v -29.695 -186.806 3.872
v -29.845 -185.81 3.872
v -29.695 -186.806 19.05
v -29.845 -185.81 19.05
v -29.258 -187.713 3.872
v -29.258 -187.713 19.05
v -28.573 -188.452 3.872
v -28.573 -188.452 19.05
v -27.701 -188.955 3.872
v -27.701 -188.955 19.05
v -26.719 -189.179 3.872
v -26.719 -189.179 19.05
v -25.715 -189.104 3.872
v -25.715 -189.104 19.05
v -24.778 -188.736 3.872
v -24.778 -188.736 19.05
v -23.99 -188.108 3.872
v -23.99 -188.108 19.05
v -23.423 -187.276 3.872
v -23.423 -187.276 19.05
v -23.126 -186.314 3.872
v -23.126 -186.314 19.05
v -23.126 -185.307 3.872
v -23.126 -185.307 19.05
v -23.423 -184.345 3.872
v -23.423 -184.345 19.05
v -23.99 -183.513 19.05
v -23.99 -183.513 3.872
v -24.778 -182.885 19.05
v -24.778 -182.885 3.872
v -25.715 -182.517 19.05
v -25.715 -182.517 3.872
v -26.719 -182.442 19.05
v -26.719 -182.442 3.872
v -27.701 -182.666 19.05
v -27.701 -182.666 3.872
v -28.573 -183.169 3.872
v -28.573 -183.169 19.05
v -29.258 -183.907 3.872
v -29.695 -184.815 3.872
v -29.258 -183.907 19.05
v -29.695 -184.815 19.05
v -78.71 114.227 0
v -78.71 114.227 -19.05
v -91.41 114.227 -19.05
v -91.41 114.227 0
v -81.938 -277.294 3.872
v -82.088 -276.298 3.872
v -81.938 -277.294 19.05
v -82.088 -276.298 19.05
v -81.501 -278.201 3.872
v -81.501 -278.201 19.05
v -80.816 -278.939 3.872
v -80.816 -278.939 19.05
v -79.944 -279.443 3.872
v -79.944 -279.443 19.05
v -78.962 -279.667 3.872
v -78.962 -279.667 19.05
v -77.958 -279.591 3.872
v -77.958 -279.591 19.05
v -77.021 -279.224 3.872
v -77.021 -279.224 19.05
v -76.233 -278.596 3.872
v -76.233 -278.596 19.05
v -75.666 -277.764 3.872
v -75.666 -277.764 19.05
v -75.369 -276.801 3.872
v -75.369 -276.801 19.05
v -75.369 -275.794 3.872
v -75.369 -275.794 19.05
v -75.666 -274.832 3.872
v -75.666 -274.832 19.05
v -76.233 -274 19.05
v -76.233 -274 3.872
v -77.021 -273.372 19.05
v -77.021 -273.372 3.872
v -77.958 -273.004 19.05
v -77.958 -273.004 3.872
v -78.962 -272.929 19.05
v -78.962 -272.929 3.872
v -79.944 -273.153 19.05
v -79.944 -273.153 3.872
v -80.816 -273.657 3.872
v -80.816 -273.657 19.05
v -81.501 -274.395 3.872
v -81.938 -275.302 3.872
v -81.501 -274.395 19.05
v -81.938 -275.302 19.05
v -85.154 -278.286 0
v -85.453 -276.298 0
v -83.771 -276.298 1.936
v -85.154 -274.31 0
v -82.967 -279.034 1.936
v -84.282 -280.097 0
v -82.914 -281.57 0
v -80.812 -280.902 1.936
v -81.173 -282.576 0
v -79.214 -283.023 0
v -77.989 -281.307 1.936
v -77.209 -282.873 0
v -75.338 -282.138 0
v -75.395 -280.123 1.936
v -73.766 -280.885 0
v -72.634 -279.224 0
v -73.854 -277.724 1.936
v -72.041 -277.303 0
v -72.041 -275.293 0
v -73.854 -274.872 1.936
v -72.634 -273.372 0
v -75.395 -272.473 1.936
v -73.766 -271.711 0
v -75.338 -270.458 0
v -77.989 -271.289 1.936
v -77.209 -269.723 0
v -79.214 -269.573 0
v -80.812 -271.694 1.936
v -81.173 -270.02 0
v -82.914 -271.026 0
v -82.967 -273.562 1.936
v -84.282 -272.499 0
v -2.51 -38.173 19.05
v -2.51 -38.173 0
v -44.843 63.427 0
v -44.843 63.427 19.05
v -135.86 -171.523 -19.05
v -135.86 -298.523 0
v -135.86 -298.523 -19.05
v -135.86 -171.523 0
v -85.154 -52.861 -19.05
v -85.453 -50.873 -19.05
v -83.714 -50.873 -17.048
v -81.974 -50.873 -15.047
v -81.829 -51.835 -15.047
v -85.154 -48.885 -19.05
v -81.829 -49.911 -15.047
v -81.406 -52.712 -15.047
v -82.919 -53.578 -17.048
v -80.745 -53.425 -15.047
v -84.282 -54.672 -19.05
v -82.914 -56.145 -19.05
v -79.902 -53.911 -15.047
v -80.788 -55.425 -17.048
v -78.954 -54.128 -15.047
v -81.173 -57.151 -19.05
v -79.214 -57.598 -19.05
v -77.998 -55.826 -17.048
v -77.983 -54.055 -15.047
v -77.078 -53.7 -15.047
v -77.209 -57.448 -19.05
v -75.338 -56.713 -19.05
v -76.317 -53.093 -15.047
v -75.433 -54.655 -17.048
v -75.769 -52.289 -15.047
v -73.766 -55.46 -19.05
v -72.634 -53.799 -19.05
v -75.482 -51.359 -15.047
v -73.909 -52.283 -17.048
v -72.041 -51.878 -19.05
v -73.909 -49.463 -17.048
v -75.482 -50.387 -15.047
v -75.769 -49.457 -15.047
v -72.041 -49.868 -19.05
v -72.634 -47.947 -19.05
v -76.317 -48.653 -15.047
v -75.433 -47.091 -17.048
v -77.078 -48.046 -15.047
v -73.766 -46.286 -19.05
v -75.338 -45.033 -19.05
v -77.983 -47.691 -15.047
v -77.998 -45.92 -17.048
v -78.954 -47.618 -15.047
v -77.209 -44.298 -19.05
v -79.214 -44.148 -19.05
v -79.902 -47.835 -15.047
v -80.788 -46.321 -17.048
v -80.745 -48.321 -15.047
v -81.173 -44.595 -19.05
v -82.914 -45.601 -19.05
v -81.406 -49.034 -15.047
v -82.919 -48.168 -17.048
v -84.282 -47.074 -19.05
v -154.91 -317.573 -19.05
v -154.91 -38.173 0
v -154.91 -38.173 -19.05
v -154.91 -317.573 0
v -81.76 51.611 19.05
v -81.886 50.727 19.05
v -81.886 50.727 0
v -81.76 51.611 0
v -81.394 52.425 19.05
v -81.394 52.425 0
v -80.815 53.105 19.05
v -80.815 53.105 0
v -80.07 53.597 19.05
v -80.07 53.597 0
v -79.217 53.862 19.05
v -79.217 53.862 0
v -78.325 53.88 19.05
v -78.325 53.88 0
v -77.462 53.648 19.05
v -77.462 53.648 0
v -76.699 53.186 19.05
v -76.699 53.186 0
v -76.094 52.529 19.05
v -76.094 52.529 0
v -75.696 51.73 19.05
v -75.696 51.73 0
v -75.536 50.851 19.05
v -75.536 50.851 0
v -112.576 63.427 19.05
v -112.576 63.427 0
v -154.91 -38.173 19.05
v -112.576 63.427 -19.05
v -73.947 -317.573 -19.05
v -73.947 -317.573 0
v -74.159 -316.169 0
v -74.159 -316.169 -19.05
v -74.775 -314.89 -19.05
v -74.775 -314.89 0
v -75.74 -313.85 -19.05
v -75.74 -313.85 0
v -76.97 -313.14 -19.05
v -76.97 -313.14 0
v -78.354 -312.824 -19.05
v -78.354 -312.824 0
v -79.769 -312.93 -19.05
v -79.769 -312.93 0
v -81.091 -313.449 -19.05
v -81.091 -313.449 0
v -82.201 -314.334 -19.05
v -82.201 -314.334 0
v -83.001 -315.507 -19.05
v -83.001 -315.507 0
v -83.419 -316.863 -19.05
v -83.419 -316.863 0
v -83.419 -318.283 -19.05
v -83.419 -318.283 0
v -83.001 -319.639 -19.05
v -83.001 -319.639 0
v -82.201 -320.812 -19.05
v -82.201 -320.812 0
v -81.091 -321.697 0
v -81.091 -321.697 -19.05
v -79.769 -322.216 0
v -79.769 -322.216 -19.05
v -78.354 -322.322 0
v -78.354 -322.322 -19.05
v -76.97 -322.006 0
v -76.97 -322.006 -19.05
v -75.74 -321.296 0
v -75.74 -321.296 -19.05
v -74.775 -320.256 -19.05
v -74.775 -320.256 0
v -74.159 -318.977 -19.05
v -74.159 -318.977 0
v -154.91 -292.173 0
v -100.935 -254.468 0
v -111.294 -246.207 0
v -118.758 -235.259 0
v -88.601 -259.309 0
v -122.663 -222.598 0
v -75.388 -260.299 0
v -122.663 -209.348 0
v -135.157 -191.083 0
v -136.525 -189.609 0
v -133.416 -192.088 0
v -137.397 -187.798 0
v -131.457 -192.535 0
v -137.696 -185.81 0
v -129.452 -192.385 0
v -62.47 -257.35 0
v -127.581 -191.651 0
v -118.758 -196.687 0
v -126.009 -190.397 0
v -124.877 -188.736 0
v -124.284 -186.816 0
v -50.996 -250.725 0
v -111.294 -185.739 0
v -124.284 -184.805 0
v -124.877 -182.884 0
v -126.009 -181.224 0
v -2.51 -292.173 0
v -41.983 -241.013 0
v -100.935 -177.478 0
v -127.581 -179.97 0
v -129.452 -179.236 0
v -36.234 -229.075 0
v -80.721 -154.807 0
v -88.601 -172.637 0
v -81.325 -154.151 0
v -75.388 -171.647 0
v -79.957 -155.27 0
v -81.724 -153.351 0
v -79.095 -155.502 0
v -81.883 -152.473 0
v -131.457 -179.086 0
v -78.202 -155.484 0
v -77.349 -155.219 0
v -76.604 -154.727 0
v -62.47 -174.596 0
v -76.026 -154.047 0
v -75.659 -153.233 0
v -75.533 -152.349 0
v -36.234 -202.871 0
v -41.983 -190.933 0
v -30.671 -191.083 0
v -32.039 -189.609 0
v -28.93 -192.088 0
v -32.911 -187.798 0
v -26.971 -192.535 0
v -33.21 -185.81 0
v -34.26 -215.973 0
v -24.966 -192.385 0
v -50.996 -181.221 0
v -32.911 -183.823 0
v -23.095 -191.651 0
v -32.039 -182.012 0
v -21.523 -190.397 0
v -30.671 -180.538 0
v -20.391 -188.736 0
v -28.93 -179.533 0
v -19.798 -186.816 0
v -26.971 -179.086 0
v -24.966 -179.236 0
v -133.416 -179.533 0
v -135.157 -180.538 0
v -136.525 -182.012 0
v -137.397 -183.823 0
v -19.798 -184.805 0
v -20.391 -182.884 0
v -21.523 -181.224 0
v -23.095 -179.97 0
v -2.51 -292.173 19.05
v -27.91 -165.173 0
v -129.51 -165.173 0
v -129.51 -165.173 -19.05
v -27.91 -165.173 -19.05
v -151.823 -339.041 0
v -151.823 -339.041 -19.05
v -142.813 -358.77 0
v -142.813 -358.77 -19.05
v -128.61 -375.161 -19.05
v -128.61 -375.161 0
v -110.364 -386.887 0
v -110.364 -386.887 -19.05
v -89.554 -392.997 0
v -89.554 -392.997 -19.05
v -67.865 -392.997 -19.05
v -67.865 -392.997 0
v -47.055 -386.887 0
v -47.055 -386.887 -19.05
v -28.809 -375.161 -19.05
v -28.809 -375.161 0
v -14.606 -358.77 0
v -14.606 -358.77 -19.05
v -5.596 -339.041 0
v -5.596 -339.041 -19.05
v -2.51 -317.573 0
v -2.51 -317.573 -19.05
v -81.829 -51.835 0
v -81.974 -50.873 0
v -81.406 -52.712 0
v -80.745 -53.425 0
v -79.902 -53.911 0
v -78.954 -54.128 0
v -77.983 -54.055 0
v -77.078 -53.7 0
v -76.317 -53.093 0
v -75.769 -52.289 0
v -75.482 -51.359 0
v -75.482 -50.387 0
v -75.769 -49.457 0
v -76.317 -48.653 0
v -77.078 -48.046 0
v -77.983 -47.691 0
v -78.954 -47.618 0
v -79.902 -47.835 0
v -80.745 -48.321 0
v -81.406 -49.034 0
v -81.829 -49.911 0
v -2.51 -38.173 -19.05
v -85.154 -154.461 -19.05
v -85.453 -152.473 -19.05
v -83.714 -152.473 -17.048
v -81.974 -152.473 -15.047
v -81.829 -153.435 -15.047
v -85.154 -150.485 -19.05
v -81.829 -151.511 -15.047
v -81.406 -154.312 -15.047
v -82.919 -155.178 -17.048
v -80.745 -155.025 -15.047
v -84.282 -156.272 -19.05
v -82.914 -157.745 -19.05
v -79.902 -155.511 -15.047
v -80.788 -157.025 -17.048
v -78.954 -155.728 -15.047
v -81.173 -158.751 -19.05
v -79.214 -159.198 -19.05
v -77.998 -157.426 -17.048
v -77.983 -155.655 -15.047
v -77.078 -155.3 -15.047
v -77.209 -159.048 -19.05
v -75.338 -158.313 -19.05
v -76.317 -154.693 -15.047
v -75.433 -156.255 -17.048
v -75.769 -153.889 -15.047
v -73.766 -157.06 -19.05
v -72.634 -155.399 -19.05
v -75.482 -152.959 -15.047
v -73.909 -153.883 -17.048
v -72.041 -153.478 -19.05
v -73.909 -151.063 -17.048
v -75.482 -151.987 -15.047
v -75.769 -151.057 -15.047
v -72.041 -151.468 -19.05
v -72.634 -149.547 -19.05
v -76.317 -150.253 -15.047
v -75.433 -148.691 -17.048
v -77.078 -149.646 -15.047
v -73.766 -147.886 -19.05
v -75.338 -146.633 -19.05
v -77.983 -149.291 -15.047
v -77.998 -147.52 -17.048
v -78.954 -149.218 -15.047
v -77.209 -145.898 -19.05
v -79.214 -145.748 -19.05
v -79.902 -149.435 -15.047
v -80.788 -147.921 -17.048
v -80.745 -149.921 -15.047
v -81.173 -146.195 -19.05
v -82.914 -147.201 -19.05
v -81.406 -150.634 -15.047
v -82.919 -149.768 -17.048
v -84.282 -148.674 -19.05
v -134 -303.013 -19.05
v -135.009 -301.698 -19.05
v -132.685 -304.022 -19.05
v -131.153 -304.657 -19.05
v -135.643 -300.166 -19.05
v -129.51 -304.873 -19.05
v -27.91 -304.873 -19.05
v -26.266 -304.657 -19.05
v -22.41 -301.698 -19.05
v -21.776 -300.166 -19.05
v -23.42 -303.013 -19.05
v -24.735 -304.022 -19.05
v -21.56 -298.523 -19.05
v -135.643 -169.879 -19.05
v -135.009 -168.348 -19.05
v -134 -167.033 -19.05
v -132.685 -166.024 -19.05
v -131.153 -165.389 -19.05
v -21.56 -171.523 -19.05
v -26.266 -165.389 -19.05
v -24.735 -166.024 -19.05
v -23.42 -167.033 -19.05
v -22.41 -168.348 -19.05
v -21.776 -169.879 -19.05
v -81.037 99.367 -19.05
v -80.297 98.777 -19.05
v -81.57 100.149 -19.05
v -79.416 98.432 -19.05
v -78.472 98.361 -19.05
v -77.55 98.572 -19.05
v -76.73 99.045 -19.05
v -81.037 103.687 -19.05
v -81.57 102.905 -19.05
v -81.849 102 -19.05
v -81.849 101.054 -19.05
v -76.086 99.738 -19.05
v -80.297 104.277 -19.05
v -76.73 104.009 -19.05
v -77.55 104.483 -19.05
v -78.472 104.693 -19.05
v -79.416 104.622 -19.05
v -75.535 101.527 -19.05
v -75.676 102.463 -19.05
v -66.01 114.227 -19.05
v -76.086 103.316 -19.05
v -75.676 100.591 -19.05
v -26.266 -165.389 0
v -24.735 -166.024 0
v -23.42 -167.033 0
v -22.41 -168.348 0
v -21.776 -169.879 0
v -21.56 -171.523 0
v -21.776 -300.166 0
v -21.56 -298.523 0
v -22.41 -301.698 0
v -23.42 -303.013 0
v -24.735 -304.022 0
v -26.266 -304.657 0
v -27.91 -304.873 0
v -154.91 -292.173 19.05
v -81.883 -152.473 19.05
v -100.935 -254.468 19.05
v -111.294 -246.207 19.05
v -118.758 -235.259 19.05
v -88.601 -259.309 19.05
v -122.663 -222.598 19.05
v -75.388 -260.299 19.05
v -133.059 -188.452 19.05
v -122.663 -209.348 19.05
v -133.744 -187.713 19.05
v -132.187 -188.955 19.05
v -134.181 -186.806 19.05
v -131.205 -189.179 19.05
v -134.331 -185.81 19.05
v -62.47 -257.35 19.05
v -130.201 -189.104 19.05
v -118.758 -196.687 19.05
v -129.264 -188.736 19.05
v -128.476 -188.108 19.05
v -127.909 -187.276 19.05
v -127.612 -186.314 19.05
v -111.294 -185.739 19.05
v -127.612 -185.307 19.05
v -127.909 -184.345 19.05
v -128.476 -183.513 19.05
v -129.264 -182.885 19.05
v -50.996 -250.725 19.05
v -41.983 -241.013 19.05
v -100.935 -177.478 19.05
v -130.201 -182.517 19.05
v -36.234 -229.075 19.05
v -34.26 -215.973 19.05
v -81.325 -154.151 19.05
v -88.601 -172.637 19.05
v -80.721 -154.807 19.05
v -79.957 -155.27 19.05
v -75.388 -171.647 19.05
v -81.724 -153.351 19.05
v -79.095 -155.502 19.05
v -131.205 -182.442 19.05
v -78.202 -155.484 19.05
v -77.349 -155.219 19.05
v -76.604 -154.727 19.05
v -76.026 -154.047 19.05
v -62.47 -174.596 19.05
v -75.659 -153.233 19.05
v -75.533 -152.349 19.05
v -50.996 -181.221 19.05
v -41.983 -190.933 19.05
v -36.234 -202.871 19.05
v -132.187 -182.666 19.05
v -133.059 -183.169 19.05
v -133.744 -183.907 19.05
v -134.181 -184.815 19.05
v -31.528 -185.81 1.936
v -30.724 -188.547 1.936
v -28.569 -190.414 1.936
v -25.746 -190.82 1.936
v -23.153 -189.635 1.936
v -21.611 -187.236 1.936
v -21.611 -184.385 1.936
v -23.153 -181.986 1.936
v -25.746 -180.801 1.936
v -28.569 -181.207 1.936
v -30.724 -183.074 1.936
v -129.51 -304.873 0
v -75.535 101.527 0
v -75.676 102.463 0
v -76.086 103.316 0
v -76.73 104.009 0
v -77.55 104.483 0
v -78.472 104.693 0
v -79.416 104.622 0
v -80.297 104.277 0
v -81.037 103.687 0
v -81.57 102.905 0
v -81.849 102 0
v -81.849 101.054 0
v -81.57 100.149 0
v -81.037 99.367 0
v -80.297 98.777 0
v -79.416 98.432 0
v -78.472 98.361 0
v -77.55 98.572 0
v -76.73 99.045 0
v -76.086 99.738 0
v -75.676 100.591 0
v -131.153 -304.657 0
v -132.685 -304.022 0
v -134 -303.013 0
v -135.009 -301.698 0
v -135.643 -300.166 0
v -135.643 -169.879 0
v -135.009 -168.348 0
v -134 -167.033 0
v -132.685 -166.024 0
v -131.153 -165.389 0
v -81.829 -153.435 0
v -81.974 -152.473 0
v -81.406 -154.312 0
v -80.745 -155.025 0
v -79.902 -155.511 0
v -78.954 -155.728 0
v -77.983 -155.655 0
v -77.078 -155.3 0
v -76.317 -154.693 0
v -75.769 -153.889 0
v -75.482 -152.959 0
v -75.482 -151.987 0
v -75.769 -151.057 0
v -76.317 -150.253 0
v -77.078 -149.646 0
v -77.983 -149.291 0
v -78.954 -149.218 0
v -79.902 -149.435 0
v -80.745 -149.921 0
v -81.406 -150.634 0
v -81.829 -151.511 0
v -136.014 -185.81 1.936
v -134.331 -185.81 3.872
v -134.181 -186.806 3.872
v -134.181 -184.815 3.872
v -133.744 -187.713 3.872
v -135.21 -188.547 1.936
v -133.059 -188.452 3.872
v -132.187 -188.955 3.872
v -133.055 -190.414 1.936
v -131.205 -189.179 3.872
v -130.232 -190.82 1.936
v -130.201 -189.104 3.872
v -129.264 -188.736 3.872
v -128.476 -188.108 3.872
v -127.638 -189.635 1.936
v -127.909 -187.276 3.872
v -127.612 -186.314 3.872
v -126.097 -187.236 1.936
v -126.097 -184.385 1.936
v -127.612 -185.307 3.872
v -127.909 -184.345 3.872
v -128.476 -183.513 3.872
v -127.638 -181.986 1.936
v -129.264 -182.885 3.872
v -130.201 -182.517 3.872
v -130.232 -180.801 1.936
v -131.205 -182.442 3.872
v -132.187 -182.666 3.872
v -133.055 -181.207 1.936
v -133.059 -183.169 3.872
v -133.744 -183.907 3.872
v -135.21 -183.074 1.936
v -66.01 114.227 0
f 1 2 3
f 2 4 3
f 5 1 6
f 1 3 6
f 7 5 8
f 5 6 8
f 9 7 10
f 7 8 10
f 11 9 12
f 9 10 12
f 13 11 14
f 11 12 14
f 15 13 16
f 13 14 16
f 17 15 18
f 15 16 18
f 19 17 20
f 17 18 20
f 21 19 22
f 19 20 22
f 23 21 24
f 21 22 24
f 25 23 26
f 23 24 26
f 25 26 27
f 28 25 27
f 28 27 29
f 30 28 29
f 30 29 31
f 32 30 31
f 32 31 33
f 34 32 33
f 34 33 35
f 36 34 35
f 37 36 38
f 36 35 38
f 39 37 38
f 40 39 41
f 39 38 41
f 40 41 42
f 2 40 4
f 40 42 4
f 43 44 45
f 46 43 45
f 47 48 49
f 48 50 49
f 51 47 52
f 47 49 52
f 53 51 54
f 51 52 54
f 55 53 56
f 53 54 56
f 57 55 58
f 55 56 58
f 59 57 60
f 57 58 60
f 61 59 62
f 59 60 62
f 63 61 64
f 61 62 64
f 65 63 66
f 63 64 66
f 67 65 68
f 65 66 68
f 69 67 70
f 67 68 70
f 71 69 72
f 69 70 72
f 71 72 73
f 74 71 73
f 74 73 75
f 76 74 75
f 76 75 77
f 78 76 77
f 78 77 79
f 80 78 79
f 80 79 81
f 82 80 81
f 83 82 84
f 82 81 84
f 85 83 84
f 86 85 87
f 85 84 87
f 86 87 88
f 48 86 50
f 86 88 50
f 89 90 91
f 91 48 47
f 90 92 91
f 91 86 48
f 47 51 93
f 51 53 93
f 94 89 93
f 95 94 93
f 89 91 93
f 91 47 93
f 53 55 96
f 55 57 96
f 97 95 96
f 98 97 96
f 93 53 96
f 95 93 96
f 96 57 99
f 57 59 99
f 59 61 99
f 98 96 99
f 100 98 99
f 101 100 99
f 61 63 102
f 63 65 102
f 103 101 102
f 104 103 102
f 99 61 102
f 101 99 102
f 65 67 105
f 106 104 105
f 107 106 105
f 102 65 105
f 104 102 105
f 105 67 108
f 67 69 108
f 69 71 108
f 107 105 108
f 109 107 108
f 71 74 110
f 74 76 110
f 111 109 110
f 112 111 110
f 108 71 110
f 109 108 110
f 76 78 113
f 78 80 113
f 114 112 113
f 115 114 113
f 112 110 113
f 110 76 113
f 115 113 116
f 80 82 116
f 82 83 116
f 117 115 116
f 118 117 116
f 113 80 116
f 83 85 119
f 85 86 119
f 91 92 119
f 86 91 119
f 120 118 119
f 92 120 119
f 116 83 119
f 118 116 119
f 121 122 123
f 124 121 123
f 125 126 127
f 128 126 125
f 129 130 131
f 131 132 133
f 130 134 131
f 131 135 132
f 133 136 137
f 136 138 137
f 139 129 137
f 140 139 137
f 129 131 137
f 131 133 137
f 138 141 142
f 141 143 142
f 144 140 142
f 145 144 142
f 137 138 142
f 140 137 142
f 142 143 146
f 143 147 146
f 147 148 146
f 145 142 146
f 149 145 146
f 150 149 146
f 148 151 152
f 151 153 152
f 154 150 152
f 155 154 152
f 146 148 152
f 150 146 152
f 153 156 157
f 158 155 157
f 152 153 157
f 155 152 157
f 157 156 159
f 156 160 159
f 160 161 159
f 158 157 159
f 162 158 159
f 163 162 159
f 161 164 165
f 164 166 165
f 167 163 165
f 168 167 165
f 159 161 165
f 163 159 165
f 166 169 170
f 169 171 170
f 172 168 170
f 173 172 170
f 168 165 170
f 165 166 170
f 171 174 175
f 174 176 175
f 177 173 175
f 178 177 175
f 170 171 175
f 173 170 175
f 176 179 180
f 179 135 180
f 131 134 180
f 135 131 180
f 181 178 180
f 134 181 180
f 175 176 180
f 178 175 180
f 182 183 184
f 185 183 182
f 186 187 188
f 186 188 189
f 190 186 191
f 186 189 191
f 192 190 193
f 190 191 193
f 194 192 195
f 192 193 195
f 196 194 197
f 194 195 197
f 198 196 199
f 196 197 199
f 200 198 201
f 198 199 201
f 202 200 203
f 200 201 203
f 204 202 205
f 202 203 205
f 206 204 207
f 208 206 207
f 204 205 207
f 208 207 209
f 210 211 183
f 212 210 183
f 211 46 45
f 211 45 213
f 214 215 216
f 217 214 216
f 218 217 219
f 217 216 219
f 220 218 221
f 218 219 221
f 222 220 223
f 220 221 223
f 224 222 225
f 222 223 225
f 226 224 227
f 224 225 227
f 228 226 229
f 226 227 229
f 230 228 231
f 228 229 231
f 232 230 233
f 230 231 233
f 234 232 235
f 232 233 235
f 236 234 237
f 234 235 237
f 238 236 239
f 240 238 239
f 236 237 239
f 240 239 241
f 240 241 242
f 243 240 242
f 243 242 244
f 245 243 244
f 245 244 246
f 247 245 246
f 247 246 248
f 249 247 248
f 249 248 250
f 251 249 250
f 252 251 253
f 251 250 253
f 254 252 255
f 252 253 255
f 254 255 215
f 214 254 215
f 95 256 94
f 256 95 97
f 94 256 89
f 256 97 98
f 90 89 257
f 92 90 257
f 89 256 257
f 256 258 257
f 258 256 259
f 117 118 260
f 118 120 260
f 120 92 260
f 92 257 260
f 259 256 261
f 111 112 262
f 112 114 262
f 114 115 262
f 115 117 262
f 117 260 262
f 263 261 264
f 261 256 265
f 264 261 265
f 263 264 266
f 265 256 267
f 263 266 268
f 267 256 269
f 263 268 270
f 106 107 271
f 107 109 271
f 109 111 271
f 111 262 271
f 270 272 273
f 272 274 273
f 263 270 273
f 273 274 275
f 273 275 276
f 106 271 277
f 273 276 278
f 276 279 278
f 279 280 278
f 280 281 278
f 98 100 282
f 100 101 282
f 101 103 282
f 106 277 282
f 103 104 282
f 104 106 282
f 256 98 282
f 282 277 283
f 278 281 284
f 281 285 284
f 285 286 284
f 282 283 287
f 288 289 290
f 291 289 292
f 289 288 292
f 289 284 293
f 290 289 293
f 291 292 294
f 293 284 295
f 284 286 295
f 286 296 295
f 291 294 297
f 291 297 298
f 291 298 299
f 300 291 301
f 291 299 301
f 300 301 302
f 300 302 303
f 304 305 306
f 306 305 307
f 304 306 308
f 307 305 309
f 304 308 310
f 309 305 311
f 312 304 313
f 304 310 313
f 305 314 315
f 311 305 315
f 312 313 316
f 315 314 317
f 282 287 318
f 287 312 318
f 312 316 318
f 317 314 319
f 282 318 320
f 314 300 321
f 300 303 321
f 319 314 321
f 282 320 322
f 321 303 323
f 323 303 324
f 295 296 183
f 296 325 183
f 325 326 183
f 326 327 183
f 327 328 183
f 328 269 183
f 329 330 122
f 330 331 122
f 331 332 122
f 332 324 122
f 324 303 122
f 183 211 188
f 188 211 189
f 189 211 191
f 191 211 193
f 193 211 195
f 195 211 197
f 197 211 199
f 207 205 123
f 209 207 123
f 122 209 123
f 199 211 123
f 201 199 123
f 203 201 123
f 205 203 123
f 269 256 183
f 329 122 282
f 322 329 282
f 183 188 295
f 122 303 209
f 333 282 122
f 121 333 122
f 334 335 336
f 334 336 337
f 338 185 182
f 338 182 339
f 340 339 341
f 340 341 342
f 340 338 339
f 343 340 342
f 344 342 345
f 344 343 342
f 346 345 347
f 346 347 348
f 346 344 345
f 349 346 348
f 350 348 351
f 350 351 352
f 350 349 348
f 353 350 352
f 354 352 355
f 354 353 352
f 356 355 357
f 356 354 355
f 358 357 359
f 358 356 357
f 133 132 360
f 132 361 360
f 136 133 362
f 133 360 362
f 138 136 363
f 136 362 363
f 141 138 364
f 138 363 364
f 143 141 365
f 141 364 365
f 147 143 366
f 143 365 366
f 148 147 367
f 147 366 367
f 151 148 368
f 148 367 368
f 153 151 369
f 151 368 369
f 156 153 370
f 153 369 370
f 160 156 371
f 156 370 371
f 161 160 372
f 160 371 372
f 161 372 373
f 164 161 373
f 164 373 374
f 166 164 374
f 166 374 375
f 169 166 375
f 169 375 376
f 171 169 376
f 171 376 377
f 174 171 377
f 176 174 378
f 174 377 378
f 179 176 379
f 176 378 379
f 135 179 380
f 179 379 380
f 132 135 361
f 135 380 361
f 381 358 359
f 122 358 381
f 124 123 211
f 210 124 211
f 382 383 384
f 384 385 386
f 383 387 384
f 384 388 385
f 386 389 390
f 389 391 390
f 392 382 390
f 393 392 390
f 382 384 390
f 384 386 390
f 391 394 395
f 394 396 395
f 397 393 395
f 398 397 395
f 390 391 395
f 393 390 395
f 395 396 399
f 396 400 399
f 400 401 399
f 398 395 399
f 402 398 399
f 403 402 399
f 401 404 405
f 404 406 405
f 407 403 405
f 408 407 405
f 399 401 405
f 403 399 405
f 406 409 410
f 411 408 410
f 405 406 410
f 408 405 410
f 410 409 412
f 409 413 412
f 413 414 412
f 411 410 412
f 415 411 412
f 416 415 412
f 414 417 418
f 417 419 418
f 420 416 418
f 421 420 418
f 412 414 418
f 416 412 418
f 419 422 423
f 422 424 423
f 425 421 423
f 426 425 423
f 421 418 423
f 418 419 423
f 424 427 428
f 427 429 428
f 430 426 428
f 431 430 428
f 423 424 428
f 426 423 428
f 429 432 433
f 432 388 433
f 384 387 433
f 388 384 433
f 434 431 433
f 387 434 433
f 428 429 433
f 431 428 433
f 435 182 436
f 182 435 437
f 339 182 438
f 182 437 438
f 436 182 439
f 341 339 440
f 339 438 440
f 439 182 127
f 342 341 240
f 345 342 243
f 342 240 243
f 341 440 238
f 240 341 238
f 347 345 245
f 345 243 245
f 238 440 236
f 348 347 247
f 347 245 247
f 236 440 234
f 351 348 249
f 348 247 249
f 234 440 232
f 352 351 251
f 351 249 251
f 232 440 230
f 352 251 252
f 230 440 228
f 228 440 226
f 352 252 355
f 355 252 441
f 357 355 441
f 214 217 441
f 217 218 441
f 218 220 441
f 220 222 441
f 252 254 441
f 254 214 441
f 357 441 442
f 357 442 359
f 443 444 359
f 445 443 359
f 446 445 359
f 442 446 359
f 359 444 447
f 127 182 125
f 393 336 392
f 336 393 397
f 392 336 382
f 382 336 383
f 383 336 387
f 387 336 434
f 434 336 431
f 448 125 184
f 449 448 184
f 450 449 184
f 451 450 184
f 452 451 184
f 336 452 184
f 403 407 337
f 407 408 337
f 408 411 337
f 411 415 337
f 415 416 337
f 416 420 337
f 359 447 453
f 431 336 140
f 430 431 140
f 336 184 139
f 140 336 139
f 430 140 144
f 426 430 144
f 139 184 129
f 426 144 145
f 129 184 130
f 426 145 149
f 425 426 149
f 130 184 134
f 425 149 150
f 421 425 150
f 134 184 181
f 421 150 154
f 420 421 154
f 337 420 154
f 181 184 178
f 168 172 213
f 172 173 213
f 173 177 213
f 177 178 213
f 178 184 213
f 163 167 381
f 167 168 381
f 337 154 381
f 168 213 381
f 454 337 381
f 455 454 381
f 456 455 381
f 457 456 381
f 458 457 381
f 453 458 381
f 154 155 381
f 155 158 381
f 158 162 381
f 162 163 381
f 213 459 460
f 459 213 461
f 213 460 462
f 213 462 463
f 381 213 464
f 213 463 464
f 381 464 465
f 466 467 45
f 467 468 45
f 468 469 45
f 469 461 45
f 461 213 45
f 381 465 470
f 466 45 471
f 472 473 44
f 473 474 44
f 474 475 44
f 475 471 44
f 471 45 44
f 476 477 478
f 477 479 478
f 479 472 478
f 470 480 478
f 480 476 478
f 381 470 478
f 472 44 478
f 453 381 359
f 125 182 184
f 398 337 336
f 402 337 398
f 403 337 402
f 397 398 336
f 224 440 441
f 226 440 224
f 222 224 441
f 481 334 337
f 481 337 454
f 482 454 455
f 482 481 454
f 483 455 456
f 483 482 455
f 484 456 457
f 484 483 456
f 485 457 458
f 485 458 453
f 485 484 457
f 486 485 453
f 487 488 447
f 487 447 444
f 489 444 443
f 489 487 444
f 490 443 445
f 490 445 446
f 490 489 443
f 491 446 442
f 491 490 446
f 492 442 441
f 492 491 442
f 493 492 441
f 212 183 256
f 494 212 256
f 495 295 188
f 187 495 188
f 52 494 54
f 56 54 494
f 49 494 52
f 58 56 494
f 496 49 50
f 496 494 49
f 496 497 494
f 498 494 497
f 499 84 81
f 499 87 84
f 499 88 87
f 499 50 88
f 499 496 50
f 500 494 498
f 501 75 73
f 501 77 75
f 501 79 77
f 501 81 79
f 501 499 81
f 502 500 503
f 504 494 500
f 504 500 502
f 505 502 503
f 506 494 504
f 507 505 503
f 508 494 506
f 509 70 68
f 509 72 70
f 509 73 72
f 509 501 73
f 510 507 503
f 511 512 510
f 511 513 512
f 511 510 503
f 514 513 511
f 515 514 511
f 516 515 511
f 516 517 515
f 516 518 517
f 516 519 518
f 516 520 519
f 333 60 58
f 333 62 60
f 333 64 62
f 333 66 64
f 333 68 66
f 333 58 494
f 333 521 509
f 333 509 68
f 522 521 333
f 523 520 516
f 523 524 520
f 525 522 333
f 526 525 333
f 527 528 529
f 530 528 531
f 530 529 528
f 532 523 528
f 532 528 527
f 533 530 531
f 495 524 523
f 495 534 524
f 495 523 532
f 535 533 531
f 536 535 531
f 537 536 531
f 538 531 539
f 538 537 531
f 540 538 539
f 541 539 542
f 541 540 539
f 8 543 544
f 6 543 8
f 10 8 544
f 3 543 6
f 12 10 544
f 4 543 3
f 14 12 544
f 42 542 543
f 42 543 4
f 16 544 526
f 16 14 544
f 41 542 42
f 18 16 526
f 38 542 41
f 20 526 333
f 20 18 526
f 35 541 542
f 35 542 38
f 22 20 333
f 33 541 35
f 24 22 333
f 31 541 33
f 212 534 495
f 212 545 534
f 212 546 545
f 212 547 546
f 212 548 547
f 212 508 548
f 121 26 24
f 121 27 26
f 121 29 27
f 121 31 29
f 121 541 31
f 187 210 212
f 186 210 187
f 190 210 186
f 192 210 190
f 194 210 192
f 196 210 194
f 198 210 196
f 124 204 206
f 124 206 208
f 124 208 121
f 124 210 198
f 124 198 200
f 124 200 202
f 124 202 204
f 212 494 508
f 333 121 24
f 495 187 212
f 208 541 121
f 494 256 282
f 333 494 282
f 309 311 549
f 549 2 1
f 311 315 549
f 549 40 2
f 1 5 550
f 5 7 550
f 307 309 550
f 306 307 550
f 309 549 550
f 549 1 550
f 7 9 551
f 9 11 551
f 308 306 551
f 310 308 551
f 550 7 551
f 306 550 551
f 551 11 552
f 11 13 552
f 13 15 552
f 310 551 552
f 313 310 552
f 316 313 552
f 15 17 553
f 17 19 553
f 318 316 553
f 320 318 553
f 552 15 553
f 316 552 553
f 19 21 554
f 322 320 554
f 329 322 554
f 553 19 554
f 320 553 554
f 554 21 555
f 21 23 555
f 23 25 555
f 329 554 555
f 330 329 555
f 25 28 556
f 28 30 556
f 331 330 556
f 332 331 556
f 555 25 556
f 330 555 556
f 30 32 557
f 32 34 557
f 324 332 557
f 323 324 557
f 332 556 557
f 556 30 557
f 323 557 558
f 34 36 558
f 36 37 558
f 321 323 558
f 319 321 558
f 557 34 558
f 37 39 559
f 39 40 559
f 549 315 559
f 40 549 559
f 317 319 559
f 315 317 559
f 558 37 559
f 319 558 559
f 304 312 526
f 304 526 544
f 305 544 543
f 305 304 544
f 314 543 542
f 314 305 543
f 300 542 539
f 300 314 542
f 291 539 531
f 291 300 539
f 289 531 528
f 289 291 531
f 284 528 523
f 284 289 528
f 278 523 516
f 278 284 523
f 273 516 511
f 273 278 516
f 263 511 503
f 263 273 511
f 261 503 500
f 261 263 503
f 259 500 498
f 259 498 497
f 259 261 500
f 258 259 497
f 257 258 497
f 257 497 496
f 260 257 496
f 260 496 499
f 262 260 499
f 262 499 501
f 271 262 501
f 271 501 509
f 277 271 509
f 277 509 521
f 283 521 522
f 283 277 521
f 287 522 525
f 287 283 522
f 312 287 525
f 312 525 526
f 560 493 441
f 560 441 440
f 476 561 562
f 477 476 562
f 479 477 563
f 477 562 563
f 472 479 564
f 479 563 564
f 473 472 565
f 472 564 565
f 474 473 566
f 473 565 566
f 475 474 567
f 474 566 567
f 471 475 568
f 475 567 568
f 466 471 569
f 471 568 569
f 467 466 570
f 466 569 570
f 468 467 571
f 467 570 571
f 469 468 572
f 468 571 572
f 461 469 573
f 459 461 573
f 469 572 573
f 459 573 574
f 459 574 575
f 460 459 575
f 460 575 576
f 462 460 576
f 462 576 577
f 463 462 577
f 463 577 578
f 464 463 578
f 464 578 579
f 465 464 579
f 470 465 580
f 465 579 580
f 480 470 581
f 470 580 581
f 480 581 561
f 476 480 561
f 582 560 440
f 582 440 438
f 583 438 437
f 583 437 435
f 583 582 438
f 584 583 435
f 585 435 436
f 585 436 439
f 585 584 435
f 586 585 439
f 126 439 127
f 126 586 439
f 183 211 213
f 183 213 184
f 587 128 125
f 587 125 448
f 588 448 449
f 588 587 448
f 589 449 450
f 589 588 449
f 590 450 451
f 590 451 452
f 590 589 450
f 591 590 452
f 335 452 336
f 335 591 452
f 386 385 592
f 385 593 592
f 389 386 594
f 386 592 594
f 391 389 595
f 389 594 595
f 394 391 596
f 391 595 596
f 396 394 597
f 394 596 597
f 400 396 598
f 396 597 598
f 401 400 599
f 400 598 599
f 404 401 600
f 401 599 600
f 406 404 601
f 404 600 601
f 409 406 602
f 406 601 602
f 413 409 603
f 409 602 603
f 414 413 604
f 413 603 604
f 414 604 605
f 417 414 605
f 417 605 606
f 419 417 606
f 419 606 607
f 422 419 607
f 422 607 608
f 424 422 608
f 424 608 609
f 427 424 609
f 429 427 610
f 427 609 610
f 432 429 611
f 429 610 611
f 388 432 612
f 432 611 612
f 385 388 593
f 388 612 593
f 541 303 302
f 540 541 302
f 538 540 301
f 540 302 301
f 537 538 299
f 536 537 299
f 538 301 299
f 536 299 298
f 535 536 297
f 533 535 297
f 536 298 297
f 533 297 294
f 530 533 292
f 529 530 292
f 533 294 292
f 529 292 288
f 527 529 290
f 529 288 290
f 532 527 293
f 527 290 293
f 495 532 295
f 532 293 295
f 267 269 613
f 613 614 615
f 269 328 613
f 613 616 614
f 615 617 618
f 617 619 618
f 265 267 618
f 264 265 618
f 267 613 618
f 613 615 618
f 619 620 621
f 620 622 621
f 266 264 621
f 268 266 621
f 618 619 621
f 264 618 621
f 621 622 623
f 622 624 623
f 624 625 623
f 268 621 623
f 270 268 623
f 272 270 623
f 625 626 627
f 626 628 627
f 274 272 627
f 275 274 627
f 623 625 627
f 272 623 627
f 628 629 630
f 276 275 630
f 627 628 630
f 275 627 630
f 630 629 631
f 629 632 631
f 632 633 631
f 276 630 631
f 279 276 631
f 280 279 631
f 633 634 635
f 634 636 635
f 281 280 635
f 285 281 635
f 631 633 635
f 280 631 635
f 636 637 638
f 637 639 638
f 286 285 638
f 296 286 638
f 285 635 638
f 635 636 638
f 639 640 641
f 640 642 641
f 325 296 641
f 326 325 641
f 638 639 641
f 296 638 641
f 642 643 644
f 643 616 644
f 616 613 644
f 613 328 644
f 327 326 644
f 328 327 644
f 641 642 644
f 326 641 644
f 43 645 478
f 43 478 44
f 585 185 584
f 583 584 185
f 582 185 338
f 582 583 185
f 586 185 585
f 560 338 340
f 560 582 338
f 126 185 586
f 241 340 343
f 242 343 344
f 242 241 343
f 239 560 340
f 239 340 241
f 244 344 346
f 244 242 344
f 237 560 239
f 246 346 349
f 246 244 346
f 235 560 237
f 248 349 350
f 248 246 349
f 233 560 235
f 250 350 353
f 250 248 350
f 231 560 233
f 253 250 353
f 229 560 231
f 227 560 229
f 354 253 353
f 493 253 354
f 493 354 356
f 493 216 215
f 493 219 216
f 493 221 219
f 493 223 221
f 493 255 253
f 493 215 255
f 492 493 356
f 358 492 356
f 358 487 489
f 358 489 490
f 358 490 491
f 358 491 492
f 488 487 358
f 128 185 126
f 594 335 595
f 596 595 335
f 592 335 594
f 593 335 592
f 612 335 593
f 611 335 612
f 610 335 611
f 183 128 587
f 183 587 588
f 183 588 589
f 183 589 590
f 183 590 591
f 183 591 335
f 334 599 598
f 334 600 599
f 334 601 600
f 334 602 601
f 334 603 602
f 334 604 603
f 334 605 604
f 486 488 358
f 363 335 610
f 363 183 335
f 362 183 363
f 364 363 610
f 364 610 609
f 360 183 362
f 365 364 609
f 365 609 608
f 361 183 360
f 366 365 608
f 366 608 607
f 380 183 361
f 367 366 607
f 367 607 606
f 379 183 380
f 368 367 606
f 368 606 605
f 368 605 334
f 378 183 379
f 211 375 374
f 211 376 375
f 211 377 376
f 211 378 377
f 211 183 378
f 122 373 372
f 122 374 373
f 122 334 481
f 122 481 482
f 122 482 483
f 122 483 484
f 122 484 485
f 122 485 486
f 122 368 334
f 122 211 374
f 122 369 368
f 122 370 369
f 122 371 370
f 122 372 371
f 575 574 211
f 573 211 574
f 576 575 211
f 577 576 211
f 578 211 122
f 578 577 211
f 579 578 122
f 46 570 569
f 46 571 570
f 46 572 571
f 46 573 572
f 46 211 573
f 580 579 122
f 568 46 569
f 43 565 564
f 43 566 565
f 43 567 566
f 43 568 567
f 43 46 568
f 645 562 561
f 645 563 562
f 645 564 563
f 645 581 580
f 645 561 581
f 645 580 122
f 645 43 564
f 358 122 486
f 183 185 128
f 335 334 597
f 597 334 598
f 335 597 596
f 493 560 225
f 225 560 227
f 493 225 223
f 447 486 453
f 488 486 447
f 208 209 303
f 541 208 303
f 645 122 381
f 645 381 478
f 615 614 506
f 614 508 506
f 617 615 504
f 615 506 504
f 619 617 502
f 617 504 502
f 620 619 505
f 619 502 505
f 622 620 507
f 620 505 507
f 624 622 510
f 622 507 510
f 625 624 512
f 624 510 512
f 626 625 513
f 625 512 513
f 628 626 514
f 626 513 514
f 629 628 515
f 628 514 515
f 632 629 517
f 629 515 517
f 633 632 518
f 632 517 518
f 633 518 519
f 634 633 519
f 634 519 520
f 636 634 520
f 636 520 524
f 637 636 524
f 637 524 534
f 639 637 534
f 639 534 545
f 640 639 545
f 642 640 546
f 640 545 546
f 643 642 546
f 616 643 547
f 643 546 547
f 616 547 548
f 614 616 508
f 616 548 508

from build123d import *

# Parameters (mm, degrees)
F0_R           = 44.45
F1_DEPTH       = 19.05
F2_D           = 6.7564
F2_CSINK_D     = 13.4874
F2_CSINK_ANGLE = 82
F0_R_2         = 4.7625
F0_R_3         = 3.175
F3_DEPTH       = 19.05
F5_D           = 6.5278
F5_CSINK_D     = 13.4874
F5_CSINK_ANGLE = 82


with BuildPart() as f1:
    # F0 (on Top) → F1 (new body)
    with BuildSketch(Plane.XY):
        with BuildLine():
            Line((-44.8430006357, 63.4270252069), (-112.5764180766, 63.4270252069))
            Line((-112.5764180766, 63.4270252069), (-154.9097093561, -38.1729747931))
            Line((-154.9097093561, -38.1729747931), (-154.9097093561, -292.1729747931))
            Line((-154.9097093561, -292.1729747931), (-135.8597093561, -292.1729747931))
            Line((-135.8597093561, -292.1729747931), (-135.8597093561, -171.5229747931))
            ThreePointArc((-135.8597093561, -171.5229747931), (-133.9998374167, -167.0328467326), (-129.5097093561, -165.1729747931))
            Line((-129.5097093561, -165.1729747931), (-78.7097093561, -165.1729747931))
            Line((-78.7097093561, -165.1729747931), (-27.9097093561, -165.1729747931))
            ThreePointArc((-27.9097093561, -165.1729747931), (-23.4195812956, -167.0328467326), (-21.5597093561, -171.5229747931))
            Line((-21.5597093561, -171.5229747931), (-21.5597093561, -292.1729747931))
            Line((-21.5597093561, -292.1729747931), (-2.5097093561, -292.1729747931))
            Line((-2.5097093561, -292.1729747931), (-2.5097093561, -38.1729747931))
            Line((-2.5097093561, -38.1729747931), (-44.8430006357, 63.4270252069))
        make_face()
        with BuildLine():
            ThreePointArc((-81.8859197836, 50.7270252069), (-78.771751834, 53.9026674871), (-75.5359212621, 50.8510865164))
            Line((-75.5359212621, 50.8510865164), (-75.5334989286, -152.3489134691))
            ThreePointArc((-75.5334989286, -152.3489134691), (-78.6476668783, -155.5245557493), (-81.8834974502, -152.4729747787))
            Line((-81.8834974502, -152.4729747787), (-81.8859197836, 50.7270252069))
        make_face(mode=Mode.SUBTRACT)
        with BuildLine():
            Line((-135.8597093561, -171.5229747931), (-135.8597093561, -292.1729747931))
            Line((-135.8597093561, -292.1729747931), (-21.5597093561, -292.1729747931))
            Line((-21.5597093561, -292.1729747931), (-21.5597093561, -171.5229747931))
            ThreePointArc((-21.5597093561, -171.5229747931), (-23.4195812956, -167.0328467326), (-27.9097093561, -165.1729747931))
            Line((-27.9097093561, -165.1729747931), (-78.7097093561, -165.1729747931))
            Line((-78.7097093561, -165.1729747931), (-129.5097093561, -165.1729747931))
            ThreePointArc((-129.5097093561, -165.1729747931), (-133.9998374167, -167.0328467326), (-135.8597093561, -171.5229747931))
        make_face()
        with Locations((-78.7097093561, -215.9729747931)):
            Circle(F0_R, mode=Mode.SUBTRACT)
    extrude(amount=F1_DEPTH)

    # F2 (through all)
    with Locations(Plane(origin=(0, 0, 0), x_dir=(1, 0, 0), z_dir=(0, 0, -1))):
        with Locations((-26.4667268728, 185.8104747931), (-130.9526918394, 185.8104747931), (-78.7097093561, 276.2979747931)):
            CounterSinkHole(F2_D / 2, F2_CSINK_D / 2, counter_sink_angle=F2_CSINK_ANGLE)


with BuildPart() as f3:
    # F0 (on Top) → F3 (new body)
    with BuildSketch(Plane.XY):
        with BuildLine():
            Line((-135.8597093561, -292.1729747931), (-154.9097093561, -292.1729747931))
            Line((-154.9097093561, -292.1729747931), (-154.9097093561, -317.5729747931))
            ThreePointArc((-154.9097093561, -317.5729747931), (-78.7097093561, -393.7729747931), (-2.5097093561, -317.5729747931))
            Line((-2.5097093561, -317.5729747931), (-2.5097093561, -292.1729747931))
            Line((-2.5097093561, -292.1729747931), (-21.5597093561, -292.1729747931))
            Line((-21.5597093561, -292.1729747931), (-21.5597093561, -298.5229747931))
            ThreePointArc((-21.5597093561, -298.5229747931), (-23.4195812956, -303.0131028536), (-27.9097093561, -304.8729747931))
            Line((-27.9097093561, -304.8729747931), (-78.7097093561, -304.8729747931))
            Line((-78.7097093561, -304.8729747931), (-129.5097093561, -304.8729747931))
            ThreePointArc((-129.5097093561, -304.8729747931), (-133.9998374167, -303.0131028536), (-135.8597093561, -298.5229747931))
            Line((-135.8597093561, -298.5229747931), (-135.8597093561, -292.1729747931))
        make_face()
        with Locations((-78.7097093561, -317.5729747931)):
            Circle(F0_R_2, mode=Mode.SUBTRACT)
        with BuildLine():
            Line((-44.8430006357, 63.4270252069), (-112.5764180766, 63.4270252069))
            Line((-112.5764180766, 63.4270252069), (-154.9097093561, -38.1729747931))
            Line((-154.9097093561, -38.1729747931), (-154.9097093561, -292.1729747931))
            Line((-154.9097093561, -292.1729747931), (-135.8597093561, -292.1729747931))
            Line((-135.8597093561, -292.1729747931), (-135.8597093561, -171.5229747931))
            ThreePointArc((-135.8597093561, -171.5229747931), (-133.9998374167, -167.0328467326), (-129.5097093561, -165.1729747931))
            Line((-129.5097093561, -165.1729747931), (-78.7097093561, -165.1729747931))
            Line((-78.7097093561, -165.1729747931), (-27.9097093561, -165.1729747931))
            ThreePointArc((-27.9097093561, -165.1729747931), (-23.4195812956, -167.0328467326), (-21.5597093561, -171.5229747931))
            Line((-21.5597093561, -171.5229747931), (-21.5597093561, -292.1729747931))
            Line((-21.5597093561, -292.1729747931), (-2.5097093561, -292.1729747931))
            Line((-2.5097093561, -292.1729747931), (-2.5097093561, -38.1729747931))
            Line((-2.5097093561, -38.1729747931), (-44.8430006357, 63.4270252069))
        make_face()
        with BuildLine():
            ThreePointArc((-81.8859197836, 50.7270252069), (-78.771751834, 53.9026674871), (-75.5359212621, 50.8510865164))
            Line((-75.5359212621, 50.8510865164), (-75.5334989286, -152.3489134691))
            ThreePointArc((-75.5334989286, -152.3489134691), (-78.6476668783, -155.5245557493), (-81.8834974502, -152.4729747787))
            Line((-81.8834974502, -152.4729747787), (-81.8859197836, 50.7270252069))
        make_face(mode=Mode.SUBTRACT)
        Polygon((-91.4097093552, 114.2271766027), (-112.5764180766, 63.4270252069), (-44.8430006357, 63.4270252069), (-66.009709357, 114.2271766027), (-78.7097093561, 114.2270252069), align=None)
        with Locations((-78.7097093561, 101.527025206)):
            Circle(F0_R_3, mode=Mode.SUBTRACT)
        with BuildLine():
            Line((-75.5334989286, -152.3489134691), (-75.5359212621, 50.8510865164))
            ThreePointArc((-75.5359212621, 50.8510865164), (-78.771751834, 53.9026674871), (-81.8859197836, 50.7270252069))
            Line((-81.8859197836, 50.7270252069), (-81.8834974502, -152.4729747787))
            ThreePointArc((-81.8834974502, -152.4729747787), (-78.6476668783, -155.5245557493), (-75.5334989286, -152.3489134691))
        make_face()
    extrude(amount=-F3_DEPTH)

    # F5 (through all)
    with Locations(Plane(origin=(0, 0, -19.05), x_dir=(1, 0, 0), z_dir=(0, 0, -1))):
        with Locations((-78.7097093561, 152.4729747931), (-78.7097093561, 50.8729747931)):
            CounterSinkHole(F5_D / 2, F5_CSINK_D / 2, counter_sink_angle=F5_CSINK_ANGLE)


solid = Compound([f1.part, f3.part])
